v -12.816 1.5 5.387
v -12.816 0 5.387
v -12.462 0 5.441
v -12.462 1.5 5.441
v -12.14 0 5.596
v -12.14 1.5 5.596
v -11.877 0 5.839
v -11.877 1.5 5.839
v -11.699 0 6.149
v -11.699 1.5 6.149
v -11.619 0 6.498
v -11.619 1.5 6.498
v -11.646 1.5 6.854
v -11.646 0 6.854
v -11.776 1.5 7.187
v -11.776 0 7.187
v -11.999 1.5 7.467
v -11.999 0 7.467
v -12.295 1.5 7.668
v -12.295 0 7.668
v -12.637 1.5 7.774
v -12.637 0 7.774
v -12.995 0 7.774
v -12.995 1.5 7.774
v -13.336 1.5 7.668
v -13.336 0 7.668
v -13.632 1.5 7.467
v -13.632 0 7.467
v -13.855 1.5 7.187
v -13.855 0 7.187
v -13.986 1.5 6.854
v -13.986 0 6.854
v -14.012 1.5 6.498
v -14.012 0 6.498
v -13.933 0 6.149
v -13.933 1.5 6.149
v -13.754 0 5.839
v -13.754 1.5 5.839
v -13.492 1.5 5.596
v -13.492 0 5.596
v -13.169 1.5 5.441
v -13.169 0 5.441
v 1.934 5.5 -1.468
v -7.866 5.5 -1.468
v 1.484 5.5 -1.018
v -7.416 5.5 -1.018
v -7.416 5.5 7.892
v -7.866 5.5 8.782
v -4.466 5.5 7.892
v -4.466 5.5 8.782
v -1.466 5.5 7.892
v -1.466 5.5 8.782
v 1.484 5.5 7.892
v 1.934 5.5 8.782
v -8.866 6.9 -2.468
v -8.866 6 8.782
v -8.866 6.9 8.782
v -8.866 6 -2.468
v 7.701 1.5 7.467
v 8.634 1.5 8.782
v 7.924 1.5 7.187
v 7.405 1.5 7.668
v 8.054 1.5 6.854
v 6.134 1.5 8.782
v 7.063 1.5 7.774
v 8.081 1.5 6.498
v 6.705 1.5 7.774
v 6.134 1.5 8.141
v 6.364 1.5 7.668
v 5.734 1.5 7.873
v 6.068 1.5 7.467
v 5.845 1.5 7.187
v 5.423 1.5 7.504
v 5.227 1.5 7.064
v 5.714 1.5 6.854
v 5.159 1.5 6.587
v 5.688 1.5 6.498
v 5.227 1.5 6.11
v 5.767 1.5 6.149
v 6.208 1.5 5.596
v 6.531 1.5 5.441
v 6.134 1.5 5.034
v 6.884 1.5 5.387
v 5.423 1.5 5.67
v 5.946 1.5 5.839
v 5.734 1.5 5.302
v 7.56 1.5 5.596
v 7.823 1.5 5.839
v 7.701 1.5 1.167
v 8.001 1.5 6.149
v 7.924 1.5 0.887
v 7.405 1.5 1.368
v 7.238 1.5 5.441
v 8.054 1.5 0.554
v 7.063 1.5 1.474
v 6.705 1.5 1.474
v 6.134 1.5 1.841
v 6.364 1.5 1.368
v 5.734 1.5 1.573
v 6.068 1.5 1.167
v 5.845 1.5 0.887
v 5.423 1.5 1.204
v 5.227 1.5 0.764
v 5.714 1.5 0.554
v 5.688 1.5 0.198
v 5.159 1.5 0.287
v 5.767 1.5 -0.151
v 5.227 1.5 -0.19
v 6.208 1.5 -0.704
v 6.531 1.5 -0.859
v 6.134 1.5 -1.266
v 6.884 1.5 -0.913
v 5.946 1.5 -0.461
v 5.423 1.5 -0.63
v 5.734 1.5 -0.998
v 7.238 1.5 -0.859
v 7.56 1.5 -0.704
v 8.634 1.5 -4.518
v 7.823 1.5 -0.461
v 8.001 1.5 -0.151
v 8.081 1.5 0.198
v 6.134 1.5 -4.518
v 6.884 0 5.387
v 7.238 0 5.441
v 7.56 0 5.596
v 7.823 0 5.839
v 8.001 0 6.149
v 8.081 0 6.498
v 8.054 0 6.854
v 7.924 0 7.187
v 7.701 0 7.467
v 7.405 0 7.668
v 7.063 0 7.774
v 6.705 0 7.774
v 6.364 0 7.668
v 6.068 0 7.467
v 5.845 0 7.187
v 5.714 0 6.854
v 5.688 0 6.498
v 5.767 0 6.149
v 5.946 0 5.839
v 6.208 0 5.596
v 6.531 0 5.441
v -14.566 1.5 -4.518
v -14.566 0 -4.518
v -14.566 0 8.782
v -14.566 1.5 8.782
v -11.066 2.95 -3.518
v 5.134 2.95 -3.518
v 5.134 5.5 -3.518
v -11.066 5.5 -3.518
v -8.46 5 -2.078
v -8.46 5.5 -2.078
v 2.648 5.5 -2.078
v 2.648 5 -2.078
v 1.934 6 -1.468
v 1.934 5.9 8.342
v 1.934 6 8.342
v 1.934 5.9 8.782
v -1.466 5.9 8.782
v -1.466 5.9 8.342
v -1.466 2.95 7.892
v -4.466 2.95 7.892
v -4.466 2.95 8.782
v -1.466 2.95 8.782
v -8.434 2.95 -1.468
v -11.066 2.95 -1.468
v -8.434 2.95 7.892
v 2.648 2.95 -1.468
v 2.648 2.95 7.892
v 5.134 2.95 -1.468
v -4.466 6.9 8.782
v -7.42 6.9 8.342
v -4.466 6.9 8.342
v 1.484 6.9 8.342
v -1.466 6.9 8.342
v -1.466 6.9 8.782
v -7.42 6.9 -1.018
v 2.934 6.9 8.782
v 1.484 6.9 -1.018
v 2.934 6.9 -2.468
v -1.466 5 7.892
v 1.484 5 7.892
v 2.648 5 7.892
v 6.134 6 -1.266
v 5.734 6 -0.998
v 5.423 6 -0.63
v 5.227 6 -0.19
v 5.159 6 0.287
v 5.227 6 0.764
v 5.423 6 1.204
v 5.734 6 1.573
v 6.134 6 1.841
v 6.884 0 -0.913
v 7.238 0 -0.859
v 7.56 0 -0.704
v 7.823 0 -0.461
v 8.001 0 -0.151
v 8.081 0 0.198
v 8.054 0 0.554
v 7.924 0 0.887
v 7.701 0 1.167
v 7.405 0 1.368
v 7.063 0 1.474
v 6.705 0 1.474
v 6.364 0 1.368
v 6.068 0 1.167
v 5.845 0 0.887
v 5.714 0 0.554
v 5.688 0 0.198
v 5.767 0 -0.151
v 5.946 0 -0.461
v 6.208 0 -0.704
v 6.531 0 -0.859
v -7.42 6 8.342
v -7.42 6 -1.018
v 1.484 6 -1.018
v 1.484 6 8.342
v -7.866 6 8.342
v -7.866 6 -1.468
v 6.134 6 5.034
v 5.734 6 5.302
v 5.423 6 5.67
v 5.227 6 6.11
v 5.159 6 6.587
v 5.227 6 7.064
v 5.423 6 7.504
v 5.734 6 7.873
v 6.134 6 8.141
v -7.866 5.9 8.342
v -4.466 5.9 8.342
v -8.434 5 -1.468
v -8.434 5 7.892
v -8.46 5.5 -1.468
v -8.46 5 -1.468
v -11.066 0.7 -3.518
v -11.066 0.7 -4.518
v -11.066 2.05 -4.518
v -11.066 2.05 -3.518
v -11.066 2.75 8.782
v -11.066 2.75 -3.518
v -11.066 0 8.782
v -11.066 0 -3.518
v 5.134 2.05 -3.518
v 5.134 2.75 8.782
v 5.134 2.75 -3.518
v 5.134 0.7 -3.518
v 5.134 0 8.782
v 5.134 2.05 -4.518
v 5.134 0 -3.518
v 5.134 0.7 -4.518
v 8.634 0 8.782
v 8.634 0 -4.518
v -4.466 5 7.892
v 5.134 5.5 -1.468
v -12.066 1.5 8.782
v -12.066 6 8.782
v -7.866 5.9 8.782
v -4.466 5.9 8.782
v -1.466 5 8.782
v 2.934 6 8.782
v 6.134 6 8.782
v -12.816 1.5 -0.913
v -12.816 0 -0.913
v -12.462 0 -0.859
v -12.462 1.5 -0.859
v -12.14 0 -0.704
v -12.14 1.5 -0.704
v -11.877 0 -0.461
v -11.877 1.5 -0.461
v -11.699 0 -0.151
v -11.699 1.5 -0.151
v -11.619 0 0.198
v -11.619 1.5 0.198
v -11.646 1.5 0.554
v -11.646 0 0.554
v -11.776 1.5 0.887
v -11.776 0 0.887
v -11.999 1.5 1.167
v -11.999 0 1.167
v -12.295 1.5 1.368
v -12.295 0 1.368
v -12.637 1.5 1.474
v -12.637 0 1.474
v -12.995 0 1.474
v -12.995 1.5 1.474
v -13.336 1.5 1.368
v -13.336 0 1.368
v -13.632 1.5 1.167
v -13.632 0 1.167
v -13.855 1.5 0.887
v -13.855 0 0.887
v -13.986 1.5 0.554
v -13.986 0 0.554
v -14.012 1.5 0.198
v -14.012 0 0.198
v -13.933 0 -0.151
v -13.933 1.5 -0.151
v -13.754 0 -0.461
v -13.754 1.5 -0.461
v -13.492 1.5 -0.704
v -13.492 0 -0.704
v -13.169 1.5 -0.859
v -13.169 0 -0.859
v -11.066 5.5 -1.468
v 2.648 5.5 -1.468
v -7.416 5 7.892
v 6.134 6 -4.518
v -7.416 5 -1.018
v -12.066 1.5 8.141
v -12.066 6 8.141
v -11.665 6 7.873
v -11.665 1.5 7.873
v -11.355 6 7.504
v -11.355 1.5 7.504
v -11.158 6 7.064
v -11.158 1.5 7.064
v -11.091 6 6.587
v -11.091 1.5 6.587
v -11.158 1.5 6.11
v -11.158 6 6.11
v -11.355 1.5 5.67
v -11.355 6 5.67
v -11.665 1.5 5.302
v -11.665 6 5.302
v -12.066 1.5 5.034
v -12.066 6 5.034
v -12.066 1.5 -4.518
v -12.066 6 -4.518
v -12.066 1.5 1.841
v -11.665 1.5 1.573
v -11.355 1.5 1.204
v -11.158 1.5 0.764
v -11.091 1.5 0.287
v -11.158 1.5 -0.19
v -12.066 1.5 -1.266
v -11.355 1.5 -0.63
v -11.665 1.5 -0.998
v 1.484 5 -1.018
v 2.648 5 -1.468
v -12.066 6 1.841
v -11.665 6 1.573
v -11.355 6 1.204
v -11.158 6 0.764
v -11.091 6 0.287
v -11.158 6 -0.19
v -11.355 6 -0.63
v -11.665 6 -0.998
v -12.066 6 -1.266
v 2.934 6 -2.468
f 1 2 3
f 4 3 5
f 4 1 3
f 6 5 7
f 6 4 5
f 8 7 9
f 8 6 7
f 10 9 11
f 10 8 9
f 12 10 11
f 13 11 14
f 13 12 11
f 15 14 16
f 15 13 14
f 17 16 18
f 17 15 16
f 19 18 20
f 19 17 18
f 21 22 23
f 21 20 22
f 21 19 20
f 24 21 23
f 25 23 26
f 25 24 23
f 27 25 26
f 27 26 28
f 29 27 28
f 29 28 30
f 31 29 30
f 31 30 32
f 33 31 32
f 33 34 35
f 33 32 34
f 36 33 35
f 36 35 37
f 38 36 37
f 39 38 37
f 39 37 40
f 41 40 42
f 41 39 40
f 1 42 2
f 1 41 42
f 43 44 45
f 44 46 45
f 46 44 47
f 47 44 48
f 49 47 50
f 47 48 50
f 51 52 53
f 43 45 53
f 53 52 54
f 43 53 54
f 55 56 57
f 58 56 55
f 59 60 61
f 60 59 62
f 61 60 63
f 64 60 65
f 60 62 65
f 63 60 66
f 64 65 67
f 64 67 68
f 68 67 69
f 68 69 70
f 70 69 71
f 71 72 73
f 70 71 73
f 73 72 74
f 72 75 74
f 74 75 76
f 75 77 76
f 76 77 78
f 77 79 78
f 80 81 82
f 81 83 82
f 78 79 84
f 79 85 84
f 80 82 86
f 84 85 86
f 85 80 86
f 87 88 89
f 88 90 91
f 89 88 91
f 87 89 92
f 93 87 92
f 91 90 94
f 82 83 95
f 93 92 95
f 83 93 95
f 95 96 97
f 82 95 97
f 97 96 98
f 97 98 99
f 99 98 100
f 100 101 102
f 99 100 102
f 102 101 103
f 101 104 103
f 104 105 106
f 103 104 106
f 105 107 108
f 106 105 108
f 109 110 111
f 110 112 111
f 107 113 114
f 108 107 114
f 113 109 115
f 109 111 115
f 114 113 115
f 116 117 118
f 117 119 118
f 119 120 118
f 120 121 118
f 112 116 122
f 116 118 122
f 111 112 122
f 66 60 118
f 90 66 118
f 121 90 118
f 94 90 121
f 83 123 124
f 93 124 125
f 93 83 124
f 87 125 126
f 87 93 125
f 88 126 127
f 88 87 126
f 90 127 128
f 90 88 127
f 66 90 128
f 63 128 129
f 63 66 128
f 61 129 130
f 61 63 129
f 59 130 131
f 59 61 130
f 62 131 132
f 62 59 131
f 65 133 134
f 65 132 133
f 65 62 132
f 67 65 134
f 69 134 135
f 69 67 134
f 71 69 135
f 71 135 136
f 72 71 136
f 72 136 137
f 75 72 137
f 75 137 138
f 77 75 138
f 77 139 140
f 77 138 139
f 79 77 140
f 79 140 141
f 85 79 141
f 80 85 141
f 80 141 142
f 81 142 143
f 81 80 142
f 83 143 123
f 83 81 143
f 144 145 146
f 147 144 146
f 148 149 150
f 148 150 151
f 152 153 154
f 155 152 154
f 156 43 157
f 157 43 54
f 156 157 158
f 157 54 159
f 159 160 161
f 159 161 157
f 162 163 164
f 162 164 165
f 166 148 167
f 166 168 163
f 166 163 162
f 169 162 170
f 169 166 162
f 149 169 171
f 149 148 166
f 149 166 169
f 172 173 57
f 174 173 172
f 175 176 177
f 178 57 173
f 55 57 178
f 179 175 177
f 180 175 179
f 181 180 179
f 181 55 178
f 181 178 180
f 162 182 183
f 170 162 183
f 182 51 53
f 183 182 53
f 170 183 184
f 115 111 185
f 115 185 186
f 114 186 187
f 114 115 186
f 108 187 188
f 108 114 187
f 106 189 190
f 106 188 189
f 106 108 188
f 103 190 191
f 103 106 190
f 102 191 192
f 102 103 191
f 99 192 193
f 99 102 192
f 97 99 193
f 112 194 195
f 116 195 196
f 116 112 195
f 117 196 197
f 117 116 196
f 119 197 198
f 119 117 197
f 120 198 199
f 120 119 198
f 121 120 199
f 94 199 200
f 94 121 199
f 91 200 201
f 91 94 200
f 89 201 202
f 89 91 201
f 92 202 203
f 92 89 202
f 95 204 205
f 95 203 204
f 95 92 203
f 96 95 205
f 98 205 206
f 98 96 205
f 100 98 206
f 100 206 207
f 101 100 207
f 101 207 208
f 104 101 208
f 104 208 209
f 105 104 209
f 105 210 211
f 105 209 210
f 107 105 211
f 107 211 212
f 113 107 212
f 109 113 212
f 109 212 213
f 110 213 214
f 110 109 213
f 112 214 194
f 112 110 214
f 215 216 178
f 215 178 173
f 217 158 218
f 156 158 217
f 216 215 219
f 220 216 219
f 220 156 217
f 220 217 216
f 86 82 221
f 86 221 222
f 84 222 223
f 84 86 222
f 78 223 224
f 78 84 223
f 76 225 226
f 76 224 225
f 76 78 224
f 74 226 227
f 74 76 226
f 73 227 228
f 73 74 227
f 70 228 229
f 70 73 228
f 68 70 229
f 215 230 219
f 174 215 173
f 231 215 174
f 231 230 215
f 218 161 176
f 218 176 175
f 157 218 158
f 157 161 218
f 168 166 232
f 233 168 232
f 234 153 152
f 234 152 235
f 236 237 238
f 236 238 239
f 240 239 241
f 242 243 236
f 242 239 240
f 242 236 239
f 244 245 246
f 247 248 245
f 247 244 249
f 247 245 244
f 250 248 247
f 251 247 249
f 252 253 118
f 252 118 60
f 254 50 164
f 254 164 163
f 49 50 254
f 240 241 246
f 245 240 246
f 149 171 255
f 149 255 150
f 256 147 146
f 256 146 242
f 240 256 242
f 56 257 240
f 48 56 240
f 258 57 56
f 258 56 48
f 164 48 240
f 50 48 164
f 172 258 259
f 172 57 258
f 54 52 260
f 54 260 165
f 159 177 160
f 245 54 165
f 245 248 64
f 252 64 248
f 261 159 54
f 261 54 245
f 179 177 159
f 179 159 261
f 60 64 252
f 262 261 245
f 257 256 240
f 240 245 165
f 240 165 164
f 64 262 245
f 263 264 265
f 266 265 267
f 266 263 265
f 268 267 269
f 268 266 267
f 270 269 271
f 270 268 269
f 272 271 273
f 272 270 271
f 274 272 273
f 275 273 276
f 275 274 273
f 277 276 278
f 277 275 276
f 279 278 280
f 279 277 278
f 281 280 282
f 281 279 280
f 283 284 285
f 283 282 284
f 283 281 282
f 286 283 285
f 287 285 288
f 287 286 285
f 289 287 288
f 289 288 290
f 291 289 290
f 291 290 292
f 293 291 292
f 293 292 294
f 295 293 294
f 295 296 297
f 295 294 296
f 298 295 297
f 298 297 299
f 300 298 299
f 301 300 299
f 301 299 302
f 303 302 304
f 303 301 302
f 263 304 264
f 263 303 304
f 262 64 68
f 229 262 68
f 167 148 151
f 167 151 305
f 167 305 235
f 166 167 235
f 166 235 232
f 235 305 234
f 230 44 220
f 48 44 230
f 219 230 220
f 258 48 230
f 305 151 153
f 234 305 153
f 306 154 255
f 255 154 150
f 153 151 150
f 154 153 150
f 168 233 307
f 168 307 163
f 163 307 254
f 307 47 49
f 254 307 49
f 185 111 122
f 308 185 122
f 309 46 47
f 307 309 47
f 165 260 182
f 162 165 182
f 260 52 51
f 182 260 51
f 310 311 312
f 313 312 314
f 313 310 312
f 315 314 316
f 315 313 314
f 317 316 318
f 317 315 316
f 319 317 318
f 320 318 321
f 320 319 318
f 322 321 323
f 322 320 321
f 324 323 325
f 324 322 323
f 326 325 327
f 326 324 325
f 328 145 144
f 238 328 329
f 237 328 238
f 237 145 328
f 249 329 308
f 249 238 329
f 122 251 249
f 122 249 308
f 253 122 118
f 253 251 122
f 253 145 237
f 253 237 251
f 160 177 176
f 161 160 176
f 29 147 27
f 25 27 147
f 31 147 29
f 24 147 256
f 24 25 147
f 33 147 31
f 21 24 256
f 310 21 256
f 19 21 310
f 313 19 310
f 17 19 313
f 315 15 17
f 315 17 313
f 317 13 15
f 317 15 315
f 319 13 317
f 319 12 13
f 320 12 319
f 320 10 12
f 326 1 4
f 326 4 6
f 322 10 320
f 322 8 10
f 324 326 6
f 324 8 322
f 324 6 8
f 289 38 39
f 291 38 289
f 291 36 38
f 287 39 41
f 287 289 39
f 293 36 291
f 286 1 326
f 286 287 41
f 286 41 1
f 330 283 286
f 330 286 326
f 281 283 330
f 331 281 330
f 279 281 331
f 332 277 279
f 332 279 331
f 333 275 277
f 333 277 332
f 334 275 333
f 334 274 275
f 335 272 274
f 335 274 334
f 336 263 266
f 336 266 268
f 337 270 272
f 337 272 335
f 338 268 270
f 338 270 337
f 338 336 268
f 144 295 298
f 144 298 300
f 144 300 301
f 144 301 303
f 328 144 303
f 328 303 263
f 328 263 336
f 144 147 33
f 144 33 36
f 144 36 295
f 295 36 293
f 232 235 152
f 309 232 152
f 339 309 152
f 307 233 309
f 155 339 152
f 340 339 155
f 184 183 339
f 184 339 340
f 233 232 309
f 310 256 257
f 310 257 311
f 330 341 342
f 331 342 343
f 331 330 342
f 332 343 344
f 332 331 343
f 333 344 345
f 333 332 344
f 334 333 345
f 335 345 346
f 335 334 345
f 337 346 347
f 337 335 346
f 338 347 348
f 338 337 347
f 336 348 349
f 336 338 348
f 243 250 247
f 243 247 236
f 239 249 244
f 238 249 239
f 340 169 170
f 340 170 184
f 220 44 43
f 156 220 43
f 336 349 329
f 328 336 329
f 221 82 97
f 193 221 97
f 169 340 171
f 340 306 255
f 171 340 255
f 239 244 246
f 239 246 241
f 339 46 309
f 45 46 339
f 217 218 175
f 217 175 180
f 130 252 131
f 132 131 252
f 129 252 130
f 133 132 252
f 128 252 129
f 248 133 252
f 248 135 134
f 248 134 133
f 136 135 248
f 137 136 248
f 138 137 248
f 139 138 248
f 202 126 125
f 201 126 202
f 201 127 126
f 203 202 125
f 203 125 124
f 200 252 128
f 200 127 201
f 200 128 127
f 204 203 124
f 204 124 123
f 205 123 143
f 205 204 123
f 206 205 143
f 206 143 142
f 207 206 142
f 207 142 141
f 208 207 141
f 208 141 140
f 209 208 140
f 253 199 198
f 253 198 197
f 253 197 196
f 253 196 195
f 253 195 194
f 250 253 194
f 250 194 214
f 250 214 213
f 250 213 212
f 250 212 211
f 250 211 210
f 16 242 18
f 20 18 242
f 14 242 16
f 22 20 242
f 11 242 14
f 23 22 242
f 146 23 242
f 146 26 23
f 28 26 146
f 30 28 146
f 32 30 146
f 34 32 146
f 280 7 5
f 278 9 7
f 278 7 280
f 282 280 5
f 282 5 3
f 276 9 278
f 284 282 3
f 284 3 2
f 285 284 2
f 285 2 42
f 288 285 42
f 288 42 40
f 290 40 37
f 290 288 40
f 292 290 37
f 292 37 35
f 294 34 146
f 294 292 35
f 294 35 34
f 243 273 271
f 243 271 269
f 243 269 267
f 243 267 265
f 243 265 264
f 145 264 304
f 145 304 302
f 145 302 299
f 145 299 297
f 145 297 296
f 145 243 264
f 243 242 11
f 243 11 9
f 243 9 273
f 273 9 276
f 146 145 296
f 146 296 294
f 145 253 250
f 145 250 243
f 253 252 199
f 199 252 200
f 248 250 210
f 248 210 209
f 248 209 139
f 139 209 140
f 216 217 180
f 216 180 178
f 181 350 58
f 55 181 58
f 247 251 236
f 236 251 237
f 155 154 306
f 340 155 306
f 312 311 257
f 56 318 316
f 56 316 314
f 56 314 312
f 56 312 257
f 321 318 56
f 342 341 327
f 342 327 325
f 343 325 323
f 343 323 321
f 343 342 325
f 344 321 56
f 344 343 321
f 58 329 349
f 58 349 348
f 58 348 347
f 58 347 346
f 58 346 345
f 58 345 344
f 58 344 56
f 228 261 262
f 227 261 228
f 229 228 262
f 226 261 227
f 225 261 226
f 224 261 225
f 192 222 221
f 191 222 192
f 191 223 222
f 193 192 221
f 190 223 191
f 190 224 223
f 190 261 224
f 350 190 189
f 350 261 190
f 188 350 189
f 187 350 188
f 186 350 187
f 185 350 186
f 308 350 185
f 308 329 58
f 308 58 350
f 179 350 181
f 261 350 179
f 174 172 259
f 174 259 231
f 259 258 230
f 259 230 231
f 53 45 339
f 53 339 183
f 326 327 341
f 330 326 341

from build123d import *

# Parameters (mm, degrees)
BOSS_EXTRUDE1_DEPTH      = 5.5
SKETCH2_W                = 16.2
SKETCH2_H                = 1.35
CUT_EXTRUDE1_DEPTH       = 3
SKETCH5_W                = 18.2
SKETCH5_H                = 13.3
SKETCH5_W_2              = 9.8
SKETCH5_H_2              = 9.81
BOSS_EXTRUDE2_DEPTH      = 0.5
SKETCH6_W                = 11.107250644
SKETCH6_H                = 10.860006292
SKETCH6_W_2              = 8.9
SKETCH6_H_2              = 8.91
BOSS_EXTRUDE3_DEPTH      = 0.5
SKETCH7_W                = 16.2
SKETCH7_H                = 0.2
BOSS_EXTRUDE4_DEPTH      = 12.3
BOSS_EXTRUDE5_DEPTH      = 1.5
CUT_EXTRUDE7_DEPTH       = 19.035718964
CUT_EXTRUDE7_DEPTH_BACK  = 19.035718964
SKETCH10_R               = 1.2
SKETCH11_R               = 1.725
CUT_EXTRUDE11_DEPTH      = 10
CUT_EXTRUDE12_REACH      = 22.617
SKETCH17_W               = 9.8
SKETCH17_H               = 0.4
BOSS_EXTRUDE7_DEPTH      = 1.5
SKETCH19_W               = 8.904244722
SKETCH19_H               = 0.44
BOSS_EXTRUDE8_DEPTH      = 0.9
CUT_EXTRUDE13_DEPTH      = 1.5
CUT_EXTRUDE13_DEPTH_BACK = 1.5
SKETCH21_W               = 0.89
SKETCH21_H               = 1.9
BOSS_EXTRUDE9_START      = -10.25
SKETCH22_W               = 2.631722889
SKETCH22_H               = 2.55
SKETCH22_W_2             = 2.486658277
BOSS_EXTRUDE9_DEPTH      = 10.25
SKETCH23_W               = 3.968277111
SKETCH23_H               = 0.89
SKETCH23_W_2             = 4.113341723
BOSS_EXTRUDE11_DEPTH     = 2.05
CUT_EXTRUDE14_DEPTH      = 0.6


with BuildPart() as part:
    # Sketch1 → Boss-Extrude1 (new body)
    with BuildSketch(Plane(origin=(0, 0, 0), x_dir=(1, 0, 0), z_dir=(0, 1, 0))):
        Polygon((-11.065671851, -8.782275449), (-12.065671851, -8.782275449), (-12.065671851, 4.517724551), (6.134328149, 4.517724551), (6.134328149, -8.782275449), (5.134328149, -8.782275449), (5.134328149, 3.517724551), (-11.065671851, 3.517724551), align=None)
    extrude(amount=BOSS_EXTRUDE1_DEPTH)

    # Sketch2 → Cut-Extrude1 (cut)
    with BuildSketch(Plane(origin=(0, 0, -4.517724551), x_dir=(-1, 0, 0), z_dir=(0, 0, -1))):
        with Locations((2.965671851, 1.375)):
            Rectangle(SKETCH2_W, SKETCH2_H)
    extrude(amount=-CUT_EXTRUDE1_DEPTH, mode=Mode.SUBTRACT)

    # Sketch5 → Boss-Extrude2 (add)
    with BuildSketch(Plane(origin=(0, 5.5, 0), x_dir=(1, 0, 0), z_dir=(0, 1, 0))):
        with Locations((-2.965671851, -2.132275449)):
            Rectangle(SKETCH5_W, SKETCH5_H)
        with Locations((-2.965671851, -3.437275449)):
            Rectangle(SKETCH5_W_2, SKETCH5_H_2, mode=Mode.SUBTRACT)
    extrude(amount=BOSS_EXTRUDE2_DEPTH)

    # Sketch6 → Boss-Extrude3 (add)
    with BuildSketch(Plane.XZ.offset(-5.5)):
        with Locations((-2.90595545, 3.352272303)):
            Rectangle(SKETCH6_W, SKETCH6_H)
        with Locations((-2.965671851, 3.437275449)):
            Rectangle(SKETCH6_W_2, SKETCH6_H_2, mode=Mode.SUBTRACT)
    extrude(amount=BOSS_EXTRUDE3_DEPTH)

    # Sketch7 → Boss-Extrude4 (add)
    with BuildSketch(Plane.XY.offset(-3.517724551)):
        with Locations((-2.965671851, 2.85)):
            Rectangle(SKETCH7_W, SKETCH7_H)
    extrude(amount=BOSS_EXTRUDE4_DEPTH)

    # Sketch8 → Boss-Extrude5 (add)
    with BuildSketch(Plane(origin=(0, 0, 0), x_dir=(-1, 0, 0), z_dir=(0, -1, 0))):
        Polygon((11.065671851, -8.782275449), (11.065671851, 3.517724551), (11.065671851, 4.517724551), (12.065671851, 4.517724551), (14.565671851, 4.517724551), (14.565671851, -8.782275449), (12.065671851, -8.782275449), align=None)
        Polygon((-5.134328149, -8.782275449), (-5.134328149, 3.517724551), (-5.134328149, 4.517724551), (-6.134328149, 4.517724551), (-8.634328149, 4.517724551), (-8.634328149, -8.782275449), (-6.134328149, -8.782275449), align=None)
    extrude(amount=-BOSS_EXTRUDE5_DEPTH)

    # Sketch10 → Cut-Extrude7 (cut, two sides: drawn at the far end of the back side and taken through both)
    with BuildSketch(Plane(origin=(0, 0, 0), x_dir=(-1, 0, 0), z_dir=(0, -1, 0)).offset(-CUT_EXTRUDE7_DEPTH_BACK)):
        with Locations(Location((12.815671851, -6.587275449, 0), (0, 0, 90))):
            Circle(SKETCH10_R)
        with Locations(Location((12.815671851, -0.287275449, 0), (0, 0, 90))):
            Circle(SKETCH10_R)
        with Locations(Location((-6.884328149, -0.287275449, 0), (0, 0, 90))):
            Circle(SKETCH10_R)
        with Locations(Location((-6.884328149, -6.587275449, 0), (0, 0, 90))):
            Circle(SKETCH10_R)
    extrude(amount=CUT_EXTRUDE7_DEPTH + CUT_EXTRUDE7_DEPTH_BACK, mode=Mode.SUBTRACT)

    # Sketch11 → Cut-Extrude11 (cut)
    with BuildSketch(Plane(origin=(0, 1.5, 0), x_dir=(1, 0, 0), z_dir=(0, 1, 0))):
        with Locations((6.884328149, -0.287275449)):
            Circle(SKETCH11_R)
        with Locations((6.884328149, -6.587275449)):
            Circle(SKETCH11_R)
        with Locations((-12.815671851, -0.287275449)):
            Circle(SKETCH11_R)
        with Locations((-12.815671851, -6.587275449)):
            Circle(SKETCH11_R)
    extrude(amount=CUT_EXTRUDE11_DEPTH, mode=Mode.SUBTRACT)

    # Sketch17 → Cut-Extrude12 (cut, up to next)
    with BuildSketch(Plane.XY.offset(8.782275449), mode=Mode.PRIVATE) as cut_extrude12_sk1:
        with Locations((-2.965671851, 5.7)):
            Rectangle(SKETCH17_W, SKETCH17_H)
    cut_extrude12_tool1 = extrude(cut_extrude12_sk1.sketch, amount=-CUT_EXTRUDE12_REACH, mode=Mode.PRIVATE) & part.part
    add(cut_extrude12_tool1.solids().sort_by_distance((-2.965672, 5.7, 8.782275))[0], mode=Mode.SUBTRACT)

    # Sketch18 → Boss-Extrude7 (add)
    with BuildSketch(Plane(origin=(0, 6, 0), x_dir=(1, 0, 0), z_dir=(0, 1, 0))):
        Polygon((-7.419916573, -8.782275449), (-8.865671851, -8.782275449), (-8.865671851, 2.467724551), (-7.419916573, 2.467724551), (1.484328149, 2.467724551), (2.934328149, 2.467724551), (2.934328149, -8.782275449), (1.484328149, -8.782275449), (1.484328149, 1.017724551), (-7.419916573, 1.017724551), align=None)
    extrude(amount=BOSS_EXTRUDE7_DEPTH)

    # Sketch19 → Boss-Extrude8 (add)
    with BuildSketch(Plane(origin=(0, 6, 0), x_dir=(1, 0, 0), z_dir=(0, 1, 0))):
        with Locations((-2.967794212, -8.562275449)):
            Rectangle(SKETCH19_W, SKETCH19_H)
    extrude(amount=BOSS_EXTRUDE8_DEPTH)

    # Sketch21 → Cut-Extrude13 (cut, two sides: drawn at the far end of the back side and taken through both)
    with BuildSketch(Plane(origin=(-2.965671851, 0, 0), x_dir=(0, 0, -1), z_dir=(1, 0, 0)).offset(-CUT_EXTRUDE13_DEPTH_BACK)):
        with Locations((-8.337275449, 5.95)):
            Rectangle(SKETCH21_W, SKETCH21_H)
    extrude(amount=CUT_EXTRUDE13_DEPTH + CUT_EXTRUDE13_DEPTH_BACK, mode=Mode.SUBTRACT)

    # Sketch22 → Boss-Extrude9 (add)
    with BuildSketch(Plane.XY.offset(8.782275449).offset(BOSS_EXTRUDE9_START)):
        with Locations((-9.749810406, 4.225)):
            Rectangle(SKETCH22_W, SKETCH22_H)
        with Locations((3.89099901, 4.225)):
            Rectangle(SKETCH22_W_2, SKETCH22_H)
    extrude(amount=BOSS_EXTRUDE9_DEPTH)

    # Sketch23 → Boss-Extrude11 (add)
    with BuildSketch(Plane(origin=(0, 5, 0), x_dir=(1, 0, 0), z_dir=(0, 1, 0))):
        with Locations((-6.449810407, -8.337275449)):
            Rectangle(SKETCH23_W, SKETCH23_H)
        with Locations((0.590999011, -8.337275449)):
            Rectangle(SKETCH23_W_2, SKETCH23_H)
    extrude(amount=-BOSS_EXTRUDE11_DEPTH)

    # Sketch24 → Cut-Extrude14 (cut)
    with BuildSketch(Plane(origin=(0, 7.5, 0), x_dir=(1, 0, 0), z_dir=(0, 1, 0))):
        Polygon((-8.865671851, 1.017724551), (-8.865671851, -8.782275449), (-7.419916573, -8.782275449), (-7.419916573, 1.017724551), (1.484328149, 1.017724551), (1.484328149, -8.782275449), (2.934328149, -8.782275449), (2.934328149, 1.017724551), (2.934328149, 2.467724551), (1.484328149, 2.467724551), (-7.500141942, 2.467724551), (-8.865671851, 2.467724551), align=None)
    extrude(amount=-CUT_EXTRUDE14_DEPTH, mode=Mode.SUBTRACT)


solid = part.part
